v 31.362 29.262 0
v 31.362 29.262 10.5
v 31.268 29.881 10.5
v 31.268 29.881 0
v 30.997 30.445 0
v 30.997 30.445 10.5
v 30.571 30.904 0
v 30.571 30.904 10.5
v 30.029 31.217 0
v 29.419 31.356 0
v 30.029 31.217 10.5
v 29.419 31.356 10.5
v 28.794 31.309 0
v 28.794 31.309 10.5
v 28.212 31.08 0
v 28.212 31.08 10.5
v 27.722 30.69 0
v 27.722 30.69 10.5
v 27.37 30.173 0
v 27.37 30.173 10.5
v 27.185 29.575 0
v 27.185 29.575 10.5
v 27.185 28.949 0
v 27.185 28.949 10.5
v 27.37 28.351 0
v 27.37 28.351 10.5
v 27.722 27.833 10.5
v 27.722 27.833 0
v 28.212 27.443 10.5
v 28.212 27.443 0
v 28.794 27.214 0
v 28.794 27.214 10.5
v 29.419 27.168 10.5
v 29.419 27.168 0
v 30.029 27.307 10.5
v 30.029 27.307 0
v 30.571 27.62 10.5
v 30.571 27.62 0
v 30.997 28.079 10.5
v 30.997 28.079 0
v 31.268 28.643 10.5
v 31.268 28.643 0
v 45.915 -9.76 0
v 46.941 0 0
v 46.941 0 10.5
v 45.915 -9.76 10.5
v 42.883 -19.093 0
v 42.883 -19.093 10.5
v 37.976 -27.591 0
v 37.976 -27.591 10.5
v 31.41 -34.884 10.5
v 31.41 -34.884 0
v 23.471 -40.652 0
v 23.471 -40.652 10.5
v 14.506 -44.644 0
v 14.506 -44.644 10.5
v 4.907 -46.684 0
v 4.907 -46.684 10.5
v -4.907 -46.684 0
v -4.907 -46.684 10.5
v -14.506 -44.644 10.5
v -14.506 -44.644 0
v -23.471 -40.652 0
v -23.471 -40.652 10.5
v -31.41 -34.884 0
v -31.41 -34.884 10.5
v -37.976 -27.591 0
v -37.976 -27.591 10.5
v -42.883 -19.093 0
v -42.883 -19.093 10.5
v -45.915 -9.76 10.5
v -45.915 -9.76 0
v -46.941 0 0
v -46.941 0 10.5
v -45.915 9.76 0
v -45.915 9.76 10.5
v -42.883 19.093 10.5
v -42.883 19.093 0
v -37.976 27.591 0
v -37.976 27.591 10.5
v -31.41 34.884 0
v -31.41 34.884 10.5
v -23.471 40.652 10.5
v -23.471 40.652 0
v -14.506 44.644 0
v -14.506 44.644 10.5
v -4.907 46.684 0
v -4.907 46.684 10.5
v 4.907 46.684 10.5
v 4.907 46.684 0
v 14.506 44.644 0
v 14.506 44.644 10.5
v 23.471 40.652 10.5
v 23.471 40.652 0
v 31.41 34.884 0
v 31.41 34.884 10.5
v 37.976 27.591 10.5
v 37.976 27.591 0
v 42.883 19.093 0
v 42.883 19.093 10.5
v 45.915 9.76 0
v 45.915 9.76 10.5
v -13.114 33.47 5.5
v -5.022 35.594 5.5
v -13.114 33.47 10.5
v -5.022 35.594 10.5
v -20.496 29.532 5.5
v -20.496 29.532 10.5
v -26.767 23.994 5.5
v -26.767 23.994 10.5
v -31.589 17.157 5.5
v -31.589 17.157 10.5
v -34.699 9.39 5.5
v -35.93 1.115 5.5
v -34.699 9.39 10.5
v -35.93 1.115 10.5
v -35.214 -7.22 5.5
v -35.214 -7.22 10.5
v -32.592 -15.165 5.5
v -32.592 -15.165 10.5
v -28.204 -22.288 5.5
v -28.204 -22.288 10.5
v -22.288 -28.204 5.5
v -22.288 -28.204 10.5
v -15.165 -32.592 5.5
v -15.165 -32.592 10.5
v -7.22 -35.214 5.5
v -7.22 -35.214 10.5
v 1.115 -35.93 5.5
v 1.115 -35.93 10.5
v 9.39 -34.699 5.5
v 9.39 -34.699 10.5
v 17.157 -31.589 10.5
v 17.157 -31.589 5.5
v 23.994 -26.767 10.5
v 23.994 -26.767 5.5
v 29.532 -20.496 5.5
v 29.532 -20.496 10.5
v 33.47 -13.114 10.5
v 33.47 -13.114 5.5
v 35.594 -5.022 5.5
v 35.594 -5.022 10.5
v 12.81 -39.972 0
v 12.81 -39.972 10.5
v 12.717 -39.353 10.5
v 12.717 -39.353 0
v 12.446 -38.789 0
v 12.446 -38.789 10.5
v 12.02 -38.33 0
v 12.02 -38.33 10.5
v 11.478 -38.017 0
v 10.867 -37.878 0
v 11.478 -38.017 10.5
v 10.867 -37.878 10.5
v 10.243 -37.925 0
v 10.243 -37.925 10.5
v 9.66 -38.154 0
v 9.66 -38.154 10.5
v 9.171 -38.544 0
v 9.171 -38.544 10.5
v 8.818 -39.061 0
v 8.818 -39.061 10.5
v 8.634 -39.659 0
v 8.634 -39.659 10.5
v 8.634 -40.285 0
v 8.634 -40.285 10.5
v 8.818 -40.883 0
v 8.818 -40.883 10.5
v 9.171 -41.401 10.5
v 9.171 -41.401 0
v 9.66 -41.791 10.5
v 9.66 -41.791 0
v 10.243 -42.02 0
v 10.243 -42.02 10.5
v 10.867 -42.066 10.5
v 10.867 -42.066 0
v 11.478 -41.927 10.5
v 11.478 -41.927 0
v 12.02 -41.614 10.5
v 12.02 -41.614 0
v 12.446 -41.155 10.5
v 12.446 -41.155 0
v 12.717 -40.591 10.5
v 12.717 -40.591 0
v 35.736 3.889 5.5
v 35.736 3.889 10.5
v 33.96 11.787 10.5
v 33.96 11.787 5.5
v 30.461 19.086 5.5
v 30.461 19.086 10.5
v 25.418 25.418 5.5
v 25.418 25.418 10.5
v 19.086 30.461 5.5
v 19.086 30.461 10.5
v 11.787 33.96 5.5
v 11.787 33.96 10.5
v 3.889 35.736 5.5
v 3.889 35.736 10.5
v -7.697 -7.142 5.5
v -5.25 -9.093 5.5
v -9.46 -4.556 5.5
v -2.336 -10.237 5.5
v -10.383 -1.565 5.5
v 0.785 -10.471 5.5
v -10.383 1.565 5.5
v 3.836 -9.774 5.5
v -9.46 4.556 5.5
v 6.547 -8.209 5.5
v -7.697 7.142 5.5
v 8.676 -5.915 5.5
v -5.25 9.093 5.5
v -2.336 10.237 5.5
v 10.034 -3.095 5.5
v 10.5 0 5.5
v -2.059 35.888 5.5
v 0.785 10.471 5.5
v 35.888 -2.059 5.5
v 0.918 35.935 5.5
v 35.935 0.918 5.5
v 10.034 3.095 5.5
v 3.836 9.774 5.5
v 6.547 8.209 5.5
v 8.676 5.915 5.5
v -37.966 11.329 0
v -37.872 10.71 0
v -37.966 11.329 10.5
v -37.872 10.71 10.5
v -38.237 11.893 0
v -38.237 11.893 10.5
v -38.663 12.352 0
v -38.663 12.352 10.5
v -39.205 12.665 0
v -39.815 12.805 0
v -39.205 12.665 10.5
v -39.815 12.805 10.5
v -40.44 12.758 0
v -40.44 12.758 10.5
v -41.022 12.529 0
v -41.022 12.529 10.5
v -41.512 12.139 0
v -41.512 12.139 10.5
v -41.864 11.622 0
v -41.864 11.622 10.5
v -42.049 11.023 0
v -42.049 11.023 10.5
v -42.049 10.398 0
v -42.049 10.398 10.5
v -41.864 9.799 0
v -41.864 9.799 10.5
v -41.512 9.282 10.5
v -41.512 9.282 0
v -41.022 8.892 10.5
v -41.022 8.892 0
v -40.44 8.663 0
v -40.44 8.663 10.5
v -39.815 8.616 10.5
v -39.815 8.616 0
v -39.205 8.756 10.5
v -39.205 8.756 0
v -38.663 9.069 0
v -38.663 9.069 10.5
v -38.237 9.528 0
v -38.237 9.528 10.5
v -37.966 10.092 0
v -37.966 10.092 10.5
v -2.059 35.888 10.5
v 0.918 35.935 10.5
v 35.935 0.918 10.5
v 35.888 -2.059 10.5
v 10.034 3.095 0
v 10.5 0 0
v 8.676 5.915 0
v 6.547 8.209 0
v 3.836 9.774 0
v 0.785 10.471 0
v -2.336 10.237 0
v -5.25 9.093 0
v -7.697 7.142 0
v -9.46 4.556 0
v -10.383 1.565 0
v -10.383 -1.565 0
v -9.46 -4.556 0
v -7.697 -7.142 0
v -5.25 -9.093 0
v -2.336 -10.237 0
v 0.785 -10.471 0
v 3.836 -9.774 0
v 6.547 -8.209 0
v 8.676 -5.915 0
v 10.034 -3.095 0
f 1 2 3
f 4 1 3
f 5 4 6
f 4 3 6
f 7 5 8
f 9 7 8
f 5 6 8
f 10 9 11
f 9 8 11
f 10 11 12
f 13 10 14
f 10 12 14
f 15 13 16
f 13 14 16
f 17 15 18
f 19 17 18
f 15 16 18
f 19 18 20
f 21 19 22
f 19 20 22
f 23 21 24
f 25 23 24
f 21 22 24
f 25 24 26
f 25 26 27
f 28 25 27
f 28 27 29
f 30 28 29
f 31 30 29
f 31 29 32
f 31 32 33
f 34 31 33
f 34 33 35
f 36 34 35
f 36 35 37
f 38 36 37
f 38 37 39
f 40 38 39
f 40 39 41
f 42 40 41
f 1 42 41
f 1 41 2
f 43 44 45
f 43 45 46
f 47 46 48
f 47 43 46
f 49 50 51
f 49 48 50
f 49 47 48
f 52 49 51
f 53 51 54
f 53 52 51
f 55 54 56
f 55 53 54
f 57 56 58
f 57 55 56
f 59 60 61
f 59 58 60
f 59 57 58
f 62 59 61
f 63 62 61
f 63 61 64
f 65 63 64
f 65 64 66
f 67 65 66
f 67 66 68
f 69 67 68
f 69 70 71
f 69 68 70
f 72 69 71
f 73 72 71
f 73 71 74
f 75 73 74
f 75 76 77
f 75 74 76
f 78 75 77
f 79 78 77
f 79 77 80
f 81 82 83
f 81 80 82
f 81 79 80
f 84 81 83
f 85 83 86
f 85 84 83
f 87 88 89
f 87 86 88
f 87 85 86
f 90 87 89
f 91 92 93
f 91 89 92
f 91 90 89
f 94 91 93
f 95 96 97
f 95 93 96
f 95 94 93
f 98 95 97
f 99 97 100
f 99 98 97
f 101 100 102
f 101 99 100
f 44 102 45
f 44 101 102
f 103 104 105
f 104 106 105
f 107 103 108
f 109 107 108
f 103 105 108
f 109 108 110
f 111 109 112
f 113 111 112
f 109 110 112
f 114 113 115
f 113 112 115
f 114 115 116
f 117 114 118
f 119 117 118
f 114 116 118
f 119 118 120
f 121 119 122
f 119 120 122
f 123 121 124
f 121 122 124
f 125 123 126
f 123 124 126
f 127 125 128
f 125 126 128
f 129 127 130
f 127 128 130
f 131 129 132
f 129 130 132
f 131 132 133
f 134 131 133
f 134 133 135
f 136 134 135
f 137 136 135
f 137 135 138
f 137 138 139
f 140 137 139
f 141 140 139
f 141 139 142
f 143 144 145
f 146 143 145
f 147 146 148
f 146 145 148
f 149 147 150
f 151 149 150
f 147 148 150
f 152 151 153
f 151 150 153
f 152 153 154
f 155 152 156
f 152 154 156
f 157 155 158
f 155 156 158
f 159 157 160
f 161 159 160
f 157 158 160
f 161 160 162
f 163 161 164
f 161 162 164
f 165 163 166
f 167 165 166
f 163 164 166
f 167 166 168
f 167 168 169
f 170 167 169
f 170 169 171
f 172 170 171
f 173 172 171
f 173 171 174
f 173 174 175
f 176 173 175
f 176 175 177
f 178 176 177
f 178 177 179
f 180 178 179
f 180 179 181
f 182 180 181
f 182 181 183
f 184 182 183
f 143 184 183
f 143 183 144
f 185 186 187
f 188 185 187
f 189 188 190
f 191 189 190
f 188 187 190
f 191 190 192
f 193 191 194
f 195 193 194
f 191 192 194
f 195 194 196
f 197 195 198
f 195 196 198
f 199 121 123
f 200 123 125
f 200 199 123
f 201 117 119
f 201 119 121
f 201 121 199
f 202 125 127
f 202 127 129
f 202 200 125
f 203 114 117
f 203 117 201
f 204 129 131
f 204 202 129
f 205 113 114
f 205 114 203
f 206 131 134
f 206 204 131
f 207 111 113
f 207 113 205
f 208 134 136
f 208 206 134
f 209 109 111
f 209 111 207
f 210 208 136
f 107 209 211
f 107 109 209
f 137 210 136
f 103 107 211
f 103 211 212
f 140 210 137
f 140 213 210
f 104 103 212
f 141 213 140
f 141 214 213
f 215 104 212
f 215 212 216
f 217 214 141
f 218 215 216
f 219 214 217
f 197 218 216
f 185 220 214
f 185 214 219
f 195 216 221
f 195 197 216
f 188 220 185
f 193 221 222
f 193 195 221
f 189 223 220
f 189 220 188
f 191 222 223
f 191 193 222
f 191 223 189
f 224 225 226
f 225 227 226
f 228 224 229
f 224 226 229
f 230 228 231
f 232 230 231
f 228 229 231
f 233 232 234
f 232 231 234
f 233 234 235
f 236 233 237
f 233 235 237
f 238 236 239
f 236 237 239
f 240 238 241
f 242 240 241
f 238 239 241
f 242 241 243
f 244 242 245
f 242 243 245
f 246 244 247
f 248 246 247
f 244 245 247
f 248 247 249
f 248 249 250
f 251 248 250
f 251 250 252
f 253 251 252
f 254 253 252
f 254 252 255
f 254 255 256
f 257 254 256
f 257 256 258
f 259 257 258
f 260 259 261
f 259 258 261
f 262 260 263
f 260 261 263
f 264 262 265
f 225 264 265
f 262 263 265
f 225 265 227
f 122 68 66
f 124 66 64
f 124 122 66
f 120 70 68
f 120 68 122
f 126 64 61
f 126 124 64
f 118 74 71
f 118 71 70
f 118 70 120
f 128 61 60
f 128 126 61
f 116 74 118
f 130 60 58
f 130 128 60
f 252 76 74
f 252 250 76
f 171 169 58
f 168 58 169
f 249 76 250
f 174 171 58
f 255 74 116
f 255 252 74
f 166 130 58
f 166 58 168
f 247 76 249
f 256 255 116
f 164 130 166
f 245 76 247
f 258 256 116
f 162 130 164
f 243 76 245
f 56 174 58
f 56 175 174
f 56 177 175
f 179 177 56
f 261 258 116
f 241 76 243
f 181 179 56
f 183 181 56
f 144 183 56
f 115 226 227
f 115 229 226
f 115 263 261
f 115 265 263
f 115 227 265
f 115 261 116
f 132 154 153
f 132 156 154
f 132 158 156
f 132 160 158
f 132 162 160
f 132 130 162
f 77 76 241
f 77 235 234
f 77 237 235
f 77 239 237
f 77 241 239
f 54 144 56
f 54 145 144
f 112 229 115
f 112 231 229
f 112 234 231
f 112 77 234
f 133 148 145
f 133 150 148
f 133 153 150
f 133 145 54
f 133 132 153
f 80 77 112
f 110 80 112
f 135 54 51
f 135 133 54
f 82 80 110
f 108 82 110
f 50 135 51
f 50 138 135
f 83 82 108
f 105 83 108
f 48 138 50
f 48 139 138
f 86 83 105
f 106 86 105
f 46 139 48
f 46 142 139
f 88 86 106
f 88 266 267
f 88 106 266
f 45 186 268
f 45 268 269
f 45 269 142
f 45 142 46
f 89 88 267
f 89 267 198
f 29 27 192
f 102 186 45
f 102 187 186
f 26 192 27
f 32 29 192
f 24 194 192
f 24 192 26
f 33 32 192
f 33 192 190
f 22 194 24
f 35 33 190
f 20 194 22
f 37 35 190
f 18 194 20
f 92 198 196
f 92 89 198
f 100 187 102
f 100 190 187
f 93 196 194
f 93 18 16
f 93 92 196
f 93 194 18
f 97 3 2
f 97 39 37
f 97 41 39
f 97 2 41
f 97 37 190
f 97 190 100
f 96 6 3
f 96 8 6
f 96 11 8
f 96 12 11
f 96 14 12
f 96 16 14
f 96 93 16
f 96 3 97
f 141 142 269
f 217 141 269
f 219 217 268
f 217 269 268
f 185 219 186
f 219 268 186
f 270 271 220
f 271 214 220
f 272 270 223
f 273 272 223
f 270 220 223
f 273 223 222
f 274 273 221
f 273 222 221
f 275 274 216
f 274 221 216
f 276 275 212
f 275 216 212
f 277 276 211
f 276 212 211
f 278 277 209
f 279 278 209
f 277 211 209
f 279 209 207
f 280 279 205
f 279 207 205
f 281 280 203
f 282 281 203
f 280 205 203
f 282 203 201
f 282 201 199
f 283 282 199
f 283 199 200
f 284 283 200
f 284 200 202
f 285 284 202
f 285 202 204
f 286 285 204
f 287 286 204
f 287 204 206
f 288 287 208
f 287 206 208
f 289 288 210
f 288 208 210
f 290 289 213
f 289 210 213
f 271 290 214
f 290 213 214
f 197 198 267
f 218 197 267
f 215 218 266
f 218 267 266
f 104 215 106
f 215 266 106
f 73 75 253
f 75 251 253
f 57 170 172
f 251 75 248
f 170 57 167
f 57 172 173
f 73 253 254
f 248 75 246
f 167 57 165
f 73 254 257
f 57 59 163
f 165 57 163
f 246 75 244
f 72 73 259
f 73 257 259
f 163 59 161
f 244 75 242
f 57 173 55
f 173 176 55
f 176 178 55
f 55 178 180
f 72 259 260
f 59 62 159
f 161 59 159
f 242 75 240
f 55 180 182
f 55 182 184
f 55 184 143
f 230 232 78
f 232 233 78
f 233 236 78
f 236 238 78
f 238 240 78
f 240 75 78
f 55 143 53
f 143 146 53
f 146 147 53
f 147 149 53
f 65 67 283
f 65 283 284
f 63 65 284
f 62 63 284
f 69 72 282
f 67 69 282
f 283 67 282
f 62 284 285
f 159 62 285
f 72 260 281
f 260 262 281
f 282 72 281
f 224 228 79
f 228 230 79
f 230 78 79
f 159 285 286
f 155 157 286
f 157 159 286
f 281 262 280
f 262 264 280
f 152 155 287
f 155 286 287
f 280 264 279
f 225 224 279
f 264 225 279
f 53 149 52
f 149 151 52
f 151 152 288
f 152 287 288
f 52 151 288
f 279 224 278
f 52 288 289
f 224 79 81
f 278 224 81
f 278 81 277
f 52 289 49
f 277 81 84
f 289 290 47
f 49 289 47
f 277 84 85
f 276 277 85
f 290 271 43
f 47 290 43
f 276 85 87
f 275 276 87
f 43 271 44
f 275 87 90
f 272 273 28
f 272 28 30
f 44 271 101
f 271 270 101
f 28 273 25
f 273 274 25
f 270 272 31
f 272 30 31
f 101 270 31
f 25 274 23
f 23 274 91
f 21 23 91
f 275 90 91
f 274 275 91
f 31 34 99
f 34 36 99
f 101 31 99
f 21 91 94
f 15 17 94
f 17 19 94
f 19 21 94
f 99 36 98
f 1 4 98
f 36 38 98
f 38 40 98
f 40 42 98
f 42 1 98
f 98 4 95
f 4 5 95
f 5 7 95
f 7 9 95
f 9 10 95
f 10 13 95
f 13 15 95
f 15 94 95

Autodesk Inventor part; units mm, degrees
ref_plane "YZ Plane" through (0, 0, 0) normal (1, 0, 0) x (0, 1, 0)
ref_plane "XZ Plane" through (0, 0, 0) normal (0, 1, 0) x (-1, 0, 0)
ref_plane "XY Plane" through (0, 0, 0) normal (0, 0, 1) x (1, 0, 0)
sketch "スケッチ1" plane through (0, 0, 0) normal (0, 0, 1) x (1, 0, 0)
  circle A0 centre (0, 0) radius 46.9412
  dimension "d3" = 93.8824
extrude "押し出し1" add sketch "スケッチ1" along normal blind 10.5
sketch "スケッチ2" plane through (0, 0, 10.5) normal (0, 0, 1) x (1, 0, 0)
  circle A0 centre (0, 0) radius 46.9412
  arc A1 (-5.0225, 35.5945) -> (35.5945, -5.0225) centre (0, 0) ccw
  arc A2 (35.7361, 3.8892) -> (3.8892, 35.7361) centre (0, 0) ccw
  circle A3 centre (29.2617, 29.2617) radius 2.1
  circle A4 centre (-39.9723, 10.7105) radius 2.1
  circle A5 centre (10.7105, -39.9723) radius 2.1
  circle A6 centre (0, 0) radius 35.9471
  dimension "d4" = 4.2
extrude "押し出し2" cut sketch "スケッチ2" against normal blind 5 contours A6 A2 A1
sketch "スケッチ3" plane through (0, 0, 10.5) normal (0, 0, 1) x (1, 0, 0)
  circle A0 centre (0, 0) radius 46.9412
  arc A1 (-5.0225, 35.5945) -> (35.5945, -5.0225) centre (0, 0) ccw
  arc A2 (35.7361, 3.8892) -> (3.8892, 35.7361) centre (0, 0) ccw
  circle A3 centre (29.2617, 29.2617) radius 2.1
  circle A4 centre (-39.9723, 10.7105) radius 2.1
  circle A5 centre (10.7105, -39.9723) radius 2.1
  circle A6 centre (0, 0) radius 35.9471
  dimension "d7" = 4.2
extrude "押し出し3" cut sketch "スケッチ3" against normal blind 10.5 contours A3 | A4 | A5
sketch "スケッチ4" plane through (0, 0, 5.5) normal (0, 0, 1) x (1, 0, 0)
  circle A0 centre (0, 0) radius 10.5
  circle A1 centre (0, 0) radius 10.5
extrude "押し出し4" cut sketch "スケッチ4" against normal blind 10.5
properties part number "fix_plate"
